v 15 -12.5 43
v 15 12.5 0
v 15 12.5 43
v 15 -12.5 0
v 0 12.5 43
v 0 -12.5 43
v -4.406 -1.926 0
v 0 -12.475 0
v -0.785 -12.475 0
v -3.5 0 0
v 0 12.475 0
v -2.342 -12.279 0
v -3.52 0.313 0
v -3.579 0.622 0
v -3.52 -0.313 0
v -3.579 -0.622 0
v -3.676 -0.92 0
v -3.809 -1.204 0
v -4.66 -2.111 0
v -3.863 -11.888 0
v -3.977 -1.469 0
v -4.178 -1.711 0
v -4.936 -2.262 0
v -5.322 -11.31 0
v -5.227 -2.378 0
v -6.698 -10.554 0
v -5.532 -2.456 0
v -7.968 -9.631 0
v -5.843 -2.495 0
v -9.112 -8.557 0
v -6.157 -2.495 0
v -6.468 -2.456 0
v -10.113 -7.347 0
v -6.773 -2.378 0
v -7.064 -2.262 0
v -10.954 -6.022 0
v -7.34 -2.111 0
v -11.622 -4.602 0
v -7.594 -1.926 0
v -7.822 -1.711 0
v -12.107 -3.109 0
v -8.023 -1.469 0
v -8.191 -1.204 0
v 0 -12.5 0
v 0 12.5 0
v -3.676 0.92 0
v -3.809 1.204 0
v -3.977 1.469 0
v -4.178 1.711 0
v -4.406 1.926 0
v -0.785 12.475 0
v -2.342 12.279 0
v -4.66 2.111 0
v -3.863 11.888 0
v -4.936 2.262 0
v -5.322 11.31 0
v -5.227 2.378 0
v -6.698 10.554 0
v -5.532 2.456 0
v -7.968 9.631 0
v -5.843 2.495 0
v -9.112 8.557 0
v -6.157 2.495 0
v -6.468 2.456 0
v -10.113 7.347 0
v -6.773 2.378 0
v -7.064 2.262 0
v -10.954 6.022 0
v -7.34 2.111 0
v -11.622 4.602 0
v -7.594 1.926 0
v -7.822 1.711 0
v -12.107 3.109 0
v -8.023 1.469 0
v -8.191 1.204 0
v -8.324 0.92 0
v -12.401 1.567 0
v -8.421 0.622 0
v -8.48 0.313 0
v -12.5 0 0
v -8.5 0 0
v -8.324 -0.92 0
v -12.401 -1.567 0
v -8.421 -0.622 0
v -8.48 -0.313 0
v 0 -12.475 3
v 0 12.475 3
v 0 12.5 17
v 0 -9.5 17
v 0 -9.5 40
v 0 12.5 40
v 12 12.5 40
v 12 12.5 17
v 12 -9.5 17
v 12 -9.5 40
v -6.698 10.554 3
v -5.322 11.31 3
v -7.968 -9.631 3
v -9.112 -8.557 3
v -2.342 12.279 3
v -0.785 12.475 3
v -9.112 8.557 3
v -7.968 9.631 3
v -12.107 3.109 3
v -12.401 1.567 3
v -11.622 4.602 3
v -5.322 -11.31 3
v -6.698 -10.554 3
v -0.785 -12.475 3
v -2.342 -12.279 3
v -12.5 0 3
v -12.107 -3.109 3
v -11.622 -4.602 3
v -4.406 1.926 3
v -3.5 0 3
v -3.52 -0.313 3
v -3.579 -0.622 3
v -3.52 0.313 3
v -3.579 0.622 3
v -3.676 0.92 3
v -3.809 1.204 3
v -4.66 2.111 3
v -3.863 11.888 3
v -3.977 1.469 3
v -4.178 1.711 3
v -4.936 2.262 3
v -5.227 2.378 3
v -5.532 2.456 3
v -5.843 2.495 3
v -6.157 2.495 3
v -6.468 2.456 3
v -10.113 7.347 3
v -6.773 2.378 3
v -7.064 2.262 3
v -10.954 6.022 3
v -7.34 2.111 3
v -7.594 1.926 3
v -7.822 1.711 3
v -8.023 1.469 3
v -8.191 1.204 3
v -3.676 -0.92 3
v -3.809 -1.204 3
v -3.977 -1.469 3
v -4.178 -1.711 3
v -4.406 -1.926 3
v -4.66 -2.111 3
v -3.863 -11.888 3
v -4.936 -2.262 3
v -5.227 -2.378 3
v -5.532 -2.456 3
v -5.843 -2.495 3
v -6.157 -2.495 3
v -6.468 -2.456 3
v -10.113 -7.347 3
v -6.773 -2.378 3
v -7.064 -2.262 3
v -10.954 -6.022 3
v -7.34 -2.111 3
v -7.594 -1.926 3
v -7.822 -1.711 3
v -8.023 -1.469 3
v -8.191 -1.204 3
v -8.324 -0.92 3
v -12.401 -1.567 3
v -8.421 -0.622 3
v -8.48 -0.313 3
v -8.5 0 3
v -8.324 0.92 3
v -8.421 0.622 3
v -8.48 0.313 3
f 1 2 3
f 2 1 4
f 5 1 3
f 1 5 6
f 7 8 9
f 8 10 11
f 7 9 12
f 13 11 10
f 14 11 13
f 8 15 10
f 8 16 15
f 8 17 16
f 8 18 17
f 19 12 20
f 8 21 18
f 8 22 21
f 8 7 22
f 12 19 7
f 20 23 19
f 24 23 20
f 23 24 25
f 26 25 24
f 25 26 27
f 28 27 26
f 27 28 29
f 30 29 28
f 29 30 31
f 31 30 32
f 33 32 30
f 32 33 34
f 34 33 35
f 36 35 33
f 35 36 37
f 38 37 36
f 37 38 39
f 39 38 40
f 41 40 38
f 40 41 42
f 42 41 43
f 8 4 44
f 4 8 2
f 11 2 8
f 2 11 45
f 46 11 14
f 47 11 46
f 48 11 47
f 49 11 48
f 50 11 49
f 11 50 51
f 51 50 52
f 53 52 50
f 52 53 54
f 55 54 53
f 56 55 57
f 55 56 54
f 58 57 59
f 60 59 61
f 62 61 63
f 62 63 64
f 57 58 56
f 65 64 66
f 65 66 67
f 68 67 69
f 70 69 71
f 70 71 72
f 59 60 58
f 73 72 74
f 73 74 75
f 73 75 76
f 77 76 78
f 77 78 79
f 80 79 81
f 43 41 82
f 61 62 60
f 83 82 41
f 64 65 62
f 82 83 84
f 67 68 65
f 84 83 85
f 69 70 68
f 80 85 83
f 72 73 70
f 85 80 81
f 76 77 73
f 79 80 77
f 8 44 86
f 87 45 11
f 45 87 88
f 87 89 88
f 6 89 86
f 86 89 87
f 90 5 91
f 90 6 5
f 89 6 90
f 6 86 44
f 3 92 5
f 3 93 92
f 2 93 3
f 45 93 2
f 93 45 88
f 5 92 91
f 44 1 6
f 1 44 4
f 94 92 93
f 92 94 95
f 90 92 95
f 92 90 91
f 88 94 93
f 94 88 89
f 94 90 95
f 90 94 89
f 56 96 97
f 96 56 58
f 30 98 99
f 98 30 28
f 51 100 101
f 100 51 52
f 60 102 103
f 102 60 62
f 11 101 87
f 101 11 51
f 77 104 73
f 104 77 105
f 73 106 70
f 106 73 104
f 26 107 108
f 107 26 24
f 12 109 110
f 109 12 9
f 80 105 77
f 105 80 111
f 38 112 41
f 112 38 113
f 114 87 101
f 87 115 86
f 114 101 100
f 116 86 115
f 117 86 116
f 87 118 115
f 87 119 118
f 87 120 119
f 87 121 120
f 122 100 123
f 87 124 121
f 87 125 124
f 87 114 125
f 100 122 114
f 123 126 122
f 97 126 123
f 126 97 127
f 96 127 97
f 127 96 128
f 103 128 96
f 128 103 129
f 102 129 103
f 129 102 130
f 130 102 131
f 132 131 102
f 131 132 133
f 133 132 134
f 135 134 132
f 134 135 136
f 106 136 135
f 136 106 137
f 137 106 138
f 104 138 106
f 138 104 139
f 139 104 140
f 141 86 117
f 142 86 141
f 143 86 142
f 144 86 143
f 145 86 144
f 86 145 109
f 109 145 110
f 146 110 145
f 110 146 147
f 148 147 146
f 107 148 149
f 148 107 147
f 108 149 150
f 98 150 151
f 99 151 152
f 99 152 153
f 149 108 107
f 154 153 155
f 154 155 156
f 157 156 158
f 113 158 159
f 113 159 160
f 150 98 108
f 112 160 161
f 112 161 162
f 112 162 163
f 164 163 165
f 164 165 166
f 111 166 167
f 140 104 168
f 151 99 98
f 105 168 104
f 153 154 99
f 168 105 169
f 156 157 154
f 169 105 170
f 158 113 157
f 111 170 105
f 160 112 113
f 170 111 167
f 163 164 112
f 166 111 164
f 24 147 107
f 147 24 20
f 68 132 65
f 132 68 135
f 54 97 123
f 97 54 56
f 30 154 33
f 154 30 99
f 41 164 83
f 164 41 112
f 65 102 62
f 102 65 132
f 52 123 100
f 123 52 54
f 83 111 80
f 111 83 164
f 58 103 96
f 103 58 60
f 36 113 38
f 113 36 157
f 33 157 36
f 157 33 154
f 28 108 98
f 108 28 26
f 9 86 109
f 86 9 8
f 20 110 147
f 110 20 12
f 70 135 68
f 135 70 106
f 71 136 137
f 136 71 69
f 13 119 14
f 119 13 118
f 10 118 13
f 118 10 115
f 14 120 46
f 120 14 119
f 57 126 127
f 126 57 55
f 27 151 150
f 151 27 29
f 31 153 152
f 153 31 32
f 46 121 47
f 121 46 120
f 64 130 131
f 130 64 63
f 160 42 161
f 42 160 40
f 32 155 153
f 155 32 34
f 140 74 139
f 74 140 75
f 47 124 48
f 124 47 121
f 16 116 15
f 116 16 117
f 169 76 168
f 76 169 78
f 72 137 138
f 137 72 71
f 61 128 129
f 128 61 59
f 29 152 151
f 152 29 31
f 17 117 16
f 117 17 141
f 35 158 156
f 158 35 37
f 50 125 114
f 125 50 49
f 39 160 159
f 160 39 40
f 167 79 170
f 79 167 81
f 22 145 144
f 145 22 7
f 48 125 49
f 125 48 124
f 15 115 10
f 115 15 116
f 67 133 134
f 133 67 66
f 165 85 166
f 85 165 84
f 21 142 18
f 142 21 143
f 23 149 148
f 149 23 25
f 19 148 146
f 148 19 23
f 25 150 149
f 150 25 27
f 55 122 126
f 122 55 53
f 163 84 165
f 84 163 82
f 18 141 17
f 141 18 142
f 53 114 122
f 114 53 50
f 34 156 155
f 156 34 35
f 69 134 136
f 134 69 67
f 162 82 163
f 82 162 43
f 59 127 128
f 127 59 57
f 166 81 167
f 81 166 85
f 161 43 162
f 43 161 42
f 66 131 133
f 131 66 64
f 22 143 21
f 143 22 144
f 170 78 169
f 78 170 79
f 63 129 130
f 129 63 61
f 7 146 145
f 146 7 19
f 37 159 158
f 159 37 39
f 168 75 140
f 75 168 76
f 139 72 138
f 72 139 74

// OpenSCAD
w = 3;

$fn=50;

difference(){
union(){
translate([0,0,w/2])
cylinder(h=w,d=25,center=true);

difference(){
translate([15/2,0,43/2])
cube([15,25,43],center=true);

translate([15/2-w,w,43-23/2-w])
cube([15,25,23],center=true);
}
}
translate([-6,0,w])
cylinder(h=w*2,d=5,center=true);
}
